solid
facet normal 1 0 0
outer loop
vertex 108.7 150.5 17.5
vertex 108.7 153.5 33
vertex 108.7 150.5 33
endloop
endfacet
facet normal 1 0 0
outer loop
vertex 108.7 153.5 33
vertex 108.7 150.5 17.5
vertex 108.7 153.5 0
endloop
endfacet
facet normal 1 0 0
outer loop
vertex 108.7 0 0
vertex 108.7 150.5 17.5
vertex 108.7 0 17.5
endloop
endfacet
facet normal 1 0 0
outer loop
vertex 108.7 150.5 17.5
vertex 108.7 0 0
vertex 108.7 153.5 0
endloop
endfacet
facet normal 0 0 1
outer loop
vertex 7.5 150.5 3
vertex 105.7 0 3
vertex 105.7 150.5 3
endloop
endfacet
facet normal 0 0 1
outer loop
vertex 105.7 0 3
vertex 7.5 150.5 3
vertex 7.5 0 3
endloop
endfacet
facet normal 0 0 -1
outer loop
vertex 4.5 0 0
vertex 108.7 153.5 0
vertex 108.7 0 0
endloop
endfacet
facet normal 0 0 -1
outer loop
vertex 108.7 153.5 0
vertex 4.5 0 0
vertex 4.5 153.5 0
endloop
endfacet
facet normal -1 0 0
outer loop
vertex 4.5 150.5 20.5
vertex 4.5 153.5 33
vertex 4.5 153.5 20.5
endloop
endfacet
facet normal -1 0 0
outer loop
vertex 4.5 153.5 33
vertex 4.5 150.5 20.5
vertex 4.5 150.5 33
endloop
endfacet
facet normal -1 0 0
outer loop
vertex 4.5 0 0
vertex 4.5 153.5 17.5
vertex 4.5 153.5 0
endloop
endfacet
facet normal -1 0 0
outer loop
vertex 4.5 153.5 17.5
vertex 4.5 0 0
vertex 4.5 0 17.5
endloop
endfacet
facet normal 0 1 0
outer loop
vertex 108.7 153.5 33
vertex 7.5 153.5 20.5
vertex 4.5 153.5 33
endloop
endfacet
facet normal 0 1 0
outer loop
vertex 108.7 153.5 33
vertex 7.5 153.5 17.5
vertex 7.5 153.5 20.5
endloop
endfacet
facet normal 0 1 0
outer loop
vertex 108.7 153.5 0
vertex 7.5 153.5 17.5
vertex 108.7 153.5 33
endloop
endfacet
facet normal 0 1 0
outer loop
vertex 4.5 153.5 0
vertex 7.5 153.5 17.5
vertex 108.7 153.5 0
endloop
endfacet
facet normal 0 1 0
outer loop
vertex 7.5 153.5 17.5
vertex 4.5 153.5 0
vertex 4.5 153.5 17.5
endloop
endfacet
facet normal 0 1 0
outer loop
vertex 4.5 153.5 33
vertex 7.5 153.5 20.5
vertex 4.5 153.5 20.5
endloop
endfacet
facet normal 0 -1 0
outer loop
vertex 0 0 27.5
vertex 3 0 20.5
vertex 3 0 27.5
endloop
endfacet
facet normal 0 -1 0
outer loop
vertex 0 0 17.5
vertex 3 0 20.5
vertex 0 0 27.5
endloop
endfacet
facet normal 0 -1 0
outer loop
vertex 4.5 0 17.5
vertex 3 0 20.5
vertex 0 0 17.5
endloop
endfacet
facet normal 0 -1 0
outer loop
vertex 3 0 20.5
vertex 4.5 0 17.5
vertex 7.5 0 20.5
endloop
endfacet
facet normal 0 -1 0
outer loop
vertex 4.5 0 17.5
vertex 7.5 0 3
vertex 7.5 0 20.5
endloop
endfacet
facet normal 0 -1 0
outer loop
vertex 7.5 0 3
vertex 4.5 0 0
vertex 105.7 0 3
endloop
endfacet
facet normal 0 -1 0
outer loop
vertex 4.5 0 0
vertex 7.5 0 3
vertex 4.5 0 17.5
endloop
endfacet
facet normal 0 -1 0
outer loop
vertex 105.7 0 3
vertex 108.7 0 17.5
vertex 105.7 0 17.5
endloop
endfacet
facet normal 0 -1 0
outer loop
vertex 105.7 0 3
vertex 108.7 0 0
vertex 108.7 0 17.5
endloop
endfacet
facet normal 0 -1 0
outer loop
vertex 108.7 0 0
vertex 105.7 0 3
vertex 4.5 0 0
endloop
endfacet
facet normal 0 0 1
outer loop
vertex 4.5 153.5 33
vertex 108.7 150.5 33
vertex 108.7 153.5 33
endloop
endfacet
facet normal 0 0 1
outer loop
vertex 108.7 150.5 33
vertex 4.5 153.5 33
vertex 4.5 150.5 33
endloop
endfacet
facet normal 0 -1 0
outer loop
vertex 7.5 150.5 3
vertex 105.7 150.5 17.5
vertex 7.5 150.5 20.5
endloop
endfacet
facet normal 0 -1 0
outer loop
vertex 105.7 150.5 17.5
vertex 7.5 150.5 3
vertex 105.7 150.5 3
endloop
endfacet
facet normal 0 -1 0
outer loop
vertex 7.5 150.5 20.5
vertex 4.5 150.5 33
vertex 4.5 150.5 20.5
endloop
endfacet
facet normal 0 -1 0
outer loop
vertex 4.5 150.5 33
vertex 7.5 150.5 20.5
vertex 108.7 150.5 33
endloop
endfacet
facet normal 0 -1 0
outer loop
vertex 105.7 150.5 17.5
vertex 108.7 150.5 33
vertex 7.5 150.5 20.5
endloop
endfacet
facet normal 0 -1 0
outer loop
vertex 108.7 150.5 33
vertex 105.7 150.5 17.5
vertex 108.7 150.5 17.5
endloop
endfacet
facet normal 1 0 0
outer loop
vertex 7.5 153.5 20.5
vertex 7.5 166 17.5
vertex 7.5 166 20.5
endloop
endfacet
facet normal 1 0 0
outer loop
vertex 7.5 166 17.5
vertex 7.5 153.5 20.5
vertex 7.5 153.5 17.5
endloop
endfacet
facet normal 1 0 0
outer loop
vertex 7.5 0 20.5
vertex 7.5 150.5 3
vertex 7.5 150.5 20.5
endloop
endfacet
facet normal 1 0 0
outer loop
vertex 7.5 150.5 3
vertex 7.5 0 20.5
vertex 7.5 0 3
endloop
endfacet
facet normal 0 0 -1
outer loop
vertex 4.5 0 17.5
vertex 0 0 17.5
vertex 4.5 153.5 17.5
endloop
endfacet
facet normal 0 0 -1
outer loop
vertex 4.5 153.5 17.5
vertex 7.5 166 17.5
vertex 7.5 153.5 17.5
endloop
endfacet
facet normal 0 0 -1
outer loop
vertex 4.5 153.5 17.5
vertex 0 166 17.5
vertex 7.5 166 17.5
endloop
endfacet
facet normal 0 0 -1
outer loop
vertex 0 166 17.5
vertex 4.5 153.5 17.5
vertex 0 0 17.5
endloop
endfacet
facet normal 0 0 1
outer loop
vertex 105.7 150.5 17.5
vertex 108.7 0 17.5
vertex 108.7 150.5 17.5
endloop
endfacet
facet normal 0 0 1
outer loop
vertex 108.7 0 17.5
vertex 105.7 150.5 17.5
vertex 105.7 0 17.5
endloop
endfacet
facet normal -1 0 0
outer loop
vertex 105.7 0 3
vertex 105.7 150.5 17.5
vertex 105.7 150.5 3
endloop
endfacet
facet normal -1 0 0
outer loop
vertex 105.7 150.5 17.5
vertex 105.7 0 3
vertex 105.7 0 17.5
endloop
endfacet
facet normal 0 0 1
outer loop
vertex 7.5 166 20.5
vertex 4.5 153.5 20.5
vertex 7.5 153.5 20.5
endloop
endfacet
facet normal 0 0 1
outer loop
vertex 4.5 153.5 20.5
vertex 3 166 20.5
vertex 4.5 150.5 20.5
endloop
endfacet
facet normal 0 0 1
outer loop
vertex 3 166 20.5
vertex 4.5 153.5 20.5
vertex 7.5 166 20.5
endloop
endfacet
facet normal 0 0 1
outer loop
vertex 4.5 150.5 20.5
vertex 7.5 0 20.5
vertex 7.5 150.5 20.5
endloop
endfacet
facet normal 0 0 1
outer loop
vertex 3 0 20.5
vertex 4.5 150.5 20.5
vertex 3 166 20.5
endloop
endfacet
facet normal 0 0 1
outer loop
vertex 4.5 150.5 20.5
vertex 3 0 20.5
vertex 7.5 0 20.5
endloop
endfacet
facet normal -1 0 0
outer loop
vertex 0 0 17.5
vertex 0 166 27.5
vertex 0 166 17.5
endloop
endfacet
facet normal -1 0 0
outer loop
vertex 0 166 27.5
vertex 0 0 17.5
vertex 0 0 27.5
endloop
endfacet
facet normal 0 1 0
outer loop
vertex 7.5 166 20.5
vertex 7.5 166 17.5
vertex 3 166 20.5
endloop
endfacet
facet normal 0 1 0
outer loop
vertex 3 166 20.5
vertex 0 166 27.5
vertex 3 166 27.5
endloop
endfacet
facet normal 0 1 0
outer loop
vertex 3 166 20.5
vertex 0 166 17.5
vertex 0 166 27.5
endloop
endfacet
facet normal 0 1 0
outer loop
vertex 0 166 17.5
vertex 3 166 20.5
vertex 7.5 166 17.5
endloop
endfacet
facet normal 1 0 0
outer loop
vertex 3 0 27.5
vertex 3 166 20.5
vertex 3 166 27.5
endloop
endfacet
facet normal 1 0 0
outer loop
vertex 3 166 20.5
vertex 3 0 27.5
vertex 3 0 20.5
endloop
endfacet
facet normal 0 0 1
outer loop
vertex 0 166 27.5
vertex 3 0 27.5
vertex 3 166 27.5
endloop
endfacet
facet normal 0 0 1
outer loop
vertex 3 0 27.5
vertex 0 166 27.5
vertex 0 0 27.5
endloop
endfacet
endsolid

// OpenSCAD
$fa = 1;
$fs = 0.4;

width = 113.2;

height = 34;
depth = 166;
wall_thickness = 3;

rim_width = 4.5;
back_rim_width = 12.5;

module Bottom_back() {
    // bottom
    translate([rim_width, 0, 0])
    cube([width - 2*rim_width, depth - back_rim_width, wall_thickness]);

    // back side
    translate([rim_width, depth - back_rim_width - wall_thickness, wall_thickness])
    cube([width - 2*rim_width, wall_thickness, 30]);

    // left side
    translate([rim_width, 0, 0])
    cube([wall_thickness, depth - back_rim_width, height - 16.5]);

    // right side
    translate([width - rim_width - wall_thickness, 0, 0])
    cube([wall_thickness, depth - back_rim_width, height - 16.5]);

    // left rim
    translate([0, 0, height - 16.5])
    cube([rim_width + wall_thickness, depth, wall_thickness]);

    translate([0, 0, height - 16.5])
    cube([wall_thickness, depth, 10]);
}

Bottom_back();
